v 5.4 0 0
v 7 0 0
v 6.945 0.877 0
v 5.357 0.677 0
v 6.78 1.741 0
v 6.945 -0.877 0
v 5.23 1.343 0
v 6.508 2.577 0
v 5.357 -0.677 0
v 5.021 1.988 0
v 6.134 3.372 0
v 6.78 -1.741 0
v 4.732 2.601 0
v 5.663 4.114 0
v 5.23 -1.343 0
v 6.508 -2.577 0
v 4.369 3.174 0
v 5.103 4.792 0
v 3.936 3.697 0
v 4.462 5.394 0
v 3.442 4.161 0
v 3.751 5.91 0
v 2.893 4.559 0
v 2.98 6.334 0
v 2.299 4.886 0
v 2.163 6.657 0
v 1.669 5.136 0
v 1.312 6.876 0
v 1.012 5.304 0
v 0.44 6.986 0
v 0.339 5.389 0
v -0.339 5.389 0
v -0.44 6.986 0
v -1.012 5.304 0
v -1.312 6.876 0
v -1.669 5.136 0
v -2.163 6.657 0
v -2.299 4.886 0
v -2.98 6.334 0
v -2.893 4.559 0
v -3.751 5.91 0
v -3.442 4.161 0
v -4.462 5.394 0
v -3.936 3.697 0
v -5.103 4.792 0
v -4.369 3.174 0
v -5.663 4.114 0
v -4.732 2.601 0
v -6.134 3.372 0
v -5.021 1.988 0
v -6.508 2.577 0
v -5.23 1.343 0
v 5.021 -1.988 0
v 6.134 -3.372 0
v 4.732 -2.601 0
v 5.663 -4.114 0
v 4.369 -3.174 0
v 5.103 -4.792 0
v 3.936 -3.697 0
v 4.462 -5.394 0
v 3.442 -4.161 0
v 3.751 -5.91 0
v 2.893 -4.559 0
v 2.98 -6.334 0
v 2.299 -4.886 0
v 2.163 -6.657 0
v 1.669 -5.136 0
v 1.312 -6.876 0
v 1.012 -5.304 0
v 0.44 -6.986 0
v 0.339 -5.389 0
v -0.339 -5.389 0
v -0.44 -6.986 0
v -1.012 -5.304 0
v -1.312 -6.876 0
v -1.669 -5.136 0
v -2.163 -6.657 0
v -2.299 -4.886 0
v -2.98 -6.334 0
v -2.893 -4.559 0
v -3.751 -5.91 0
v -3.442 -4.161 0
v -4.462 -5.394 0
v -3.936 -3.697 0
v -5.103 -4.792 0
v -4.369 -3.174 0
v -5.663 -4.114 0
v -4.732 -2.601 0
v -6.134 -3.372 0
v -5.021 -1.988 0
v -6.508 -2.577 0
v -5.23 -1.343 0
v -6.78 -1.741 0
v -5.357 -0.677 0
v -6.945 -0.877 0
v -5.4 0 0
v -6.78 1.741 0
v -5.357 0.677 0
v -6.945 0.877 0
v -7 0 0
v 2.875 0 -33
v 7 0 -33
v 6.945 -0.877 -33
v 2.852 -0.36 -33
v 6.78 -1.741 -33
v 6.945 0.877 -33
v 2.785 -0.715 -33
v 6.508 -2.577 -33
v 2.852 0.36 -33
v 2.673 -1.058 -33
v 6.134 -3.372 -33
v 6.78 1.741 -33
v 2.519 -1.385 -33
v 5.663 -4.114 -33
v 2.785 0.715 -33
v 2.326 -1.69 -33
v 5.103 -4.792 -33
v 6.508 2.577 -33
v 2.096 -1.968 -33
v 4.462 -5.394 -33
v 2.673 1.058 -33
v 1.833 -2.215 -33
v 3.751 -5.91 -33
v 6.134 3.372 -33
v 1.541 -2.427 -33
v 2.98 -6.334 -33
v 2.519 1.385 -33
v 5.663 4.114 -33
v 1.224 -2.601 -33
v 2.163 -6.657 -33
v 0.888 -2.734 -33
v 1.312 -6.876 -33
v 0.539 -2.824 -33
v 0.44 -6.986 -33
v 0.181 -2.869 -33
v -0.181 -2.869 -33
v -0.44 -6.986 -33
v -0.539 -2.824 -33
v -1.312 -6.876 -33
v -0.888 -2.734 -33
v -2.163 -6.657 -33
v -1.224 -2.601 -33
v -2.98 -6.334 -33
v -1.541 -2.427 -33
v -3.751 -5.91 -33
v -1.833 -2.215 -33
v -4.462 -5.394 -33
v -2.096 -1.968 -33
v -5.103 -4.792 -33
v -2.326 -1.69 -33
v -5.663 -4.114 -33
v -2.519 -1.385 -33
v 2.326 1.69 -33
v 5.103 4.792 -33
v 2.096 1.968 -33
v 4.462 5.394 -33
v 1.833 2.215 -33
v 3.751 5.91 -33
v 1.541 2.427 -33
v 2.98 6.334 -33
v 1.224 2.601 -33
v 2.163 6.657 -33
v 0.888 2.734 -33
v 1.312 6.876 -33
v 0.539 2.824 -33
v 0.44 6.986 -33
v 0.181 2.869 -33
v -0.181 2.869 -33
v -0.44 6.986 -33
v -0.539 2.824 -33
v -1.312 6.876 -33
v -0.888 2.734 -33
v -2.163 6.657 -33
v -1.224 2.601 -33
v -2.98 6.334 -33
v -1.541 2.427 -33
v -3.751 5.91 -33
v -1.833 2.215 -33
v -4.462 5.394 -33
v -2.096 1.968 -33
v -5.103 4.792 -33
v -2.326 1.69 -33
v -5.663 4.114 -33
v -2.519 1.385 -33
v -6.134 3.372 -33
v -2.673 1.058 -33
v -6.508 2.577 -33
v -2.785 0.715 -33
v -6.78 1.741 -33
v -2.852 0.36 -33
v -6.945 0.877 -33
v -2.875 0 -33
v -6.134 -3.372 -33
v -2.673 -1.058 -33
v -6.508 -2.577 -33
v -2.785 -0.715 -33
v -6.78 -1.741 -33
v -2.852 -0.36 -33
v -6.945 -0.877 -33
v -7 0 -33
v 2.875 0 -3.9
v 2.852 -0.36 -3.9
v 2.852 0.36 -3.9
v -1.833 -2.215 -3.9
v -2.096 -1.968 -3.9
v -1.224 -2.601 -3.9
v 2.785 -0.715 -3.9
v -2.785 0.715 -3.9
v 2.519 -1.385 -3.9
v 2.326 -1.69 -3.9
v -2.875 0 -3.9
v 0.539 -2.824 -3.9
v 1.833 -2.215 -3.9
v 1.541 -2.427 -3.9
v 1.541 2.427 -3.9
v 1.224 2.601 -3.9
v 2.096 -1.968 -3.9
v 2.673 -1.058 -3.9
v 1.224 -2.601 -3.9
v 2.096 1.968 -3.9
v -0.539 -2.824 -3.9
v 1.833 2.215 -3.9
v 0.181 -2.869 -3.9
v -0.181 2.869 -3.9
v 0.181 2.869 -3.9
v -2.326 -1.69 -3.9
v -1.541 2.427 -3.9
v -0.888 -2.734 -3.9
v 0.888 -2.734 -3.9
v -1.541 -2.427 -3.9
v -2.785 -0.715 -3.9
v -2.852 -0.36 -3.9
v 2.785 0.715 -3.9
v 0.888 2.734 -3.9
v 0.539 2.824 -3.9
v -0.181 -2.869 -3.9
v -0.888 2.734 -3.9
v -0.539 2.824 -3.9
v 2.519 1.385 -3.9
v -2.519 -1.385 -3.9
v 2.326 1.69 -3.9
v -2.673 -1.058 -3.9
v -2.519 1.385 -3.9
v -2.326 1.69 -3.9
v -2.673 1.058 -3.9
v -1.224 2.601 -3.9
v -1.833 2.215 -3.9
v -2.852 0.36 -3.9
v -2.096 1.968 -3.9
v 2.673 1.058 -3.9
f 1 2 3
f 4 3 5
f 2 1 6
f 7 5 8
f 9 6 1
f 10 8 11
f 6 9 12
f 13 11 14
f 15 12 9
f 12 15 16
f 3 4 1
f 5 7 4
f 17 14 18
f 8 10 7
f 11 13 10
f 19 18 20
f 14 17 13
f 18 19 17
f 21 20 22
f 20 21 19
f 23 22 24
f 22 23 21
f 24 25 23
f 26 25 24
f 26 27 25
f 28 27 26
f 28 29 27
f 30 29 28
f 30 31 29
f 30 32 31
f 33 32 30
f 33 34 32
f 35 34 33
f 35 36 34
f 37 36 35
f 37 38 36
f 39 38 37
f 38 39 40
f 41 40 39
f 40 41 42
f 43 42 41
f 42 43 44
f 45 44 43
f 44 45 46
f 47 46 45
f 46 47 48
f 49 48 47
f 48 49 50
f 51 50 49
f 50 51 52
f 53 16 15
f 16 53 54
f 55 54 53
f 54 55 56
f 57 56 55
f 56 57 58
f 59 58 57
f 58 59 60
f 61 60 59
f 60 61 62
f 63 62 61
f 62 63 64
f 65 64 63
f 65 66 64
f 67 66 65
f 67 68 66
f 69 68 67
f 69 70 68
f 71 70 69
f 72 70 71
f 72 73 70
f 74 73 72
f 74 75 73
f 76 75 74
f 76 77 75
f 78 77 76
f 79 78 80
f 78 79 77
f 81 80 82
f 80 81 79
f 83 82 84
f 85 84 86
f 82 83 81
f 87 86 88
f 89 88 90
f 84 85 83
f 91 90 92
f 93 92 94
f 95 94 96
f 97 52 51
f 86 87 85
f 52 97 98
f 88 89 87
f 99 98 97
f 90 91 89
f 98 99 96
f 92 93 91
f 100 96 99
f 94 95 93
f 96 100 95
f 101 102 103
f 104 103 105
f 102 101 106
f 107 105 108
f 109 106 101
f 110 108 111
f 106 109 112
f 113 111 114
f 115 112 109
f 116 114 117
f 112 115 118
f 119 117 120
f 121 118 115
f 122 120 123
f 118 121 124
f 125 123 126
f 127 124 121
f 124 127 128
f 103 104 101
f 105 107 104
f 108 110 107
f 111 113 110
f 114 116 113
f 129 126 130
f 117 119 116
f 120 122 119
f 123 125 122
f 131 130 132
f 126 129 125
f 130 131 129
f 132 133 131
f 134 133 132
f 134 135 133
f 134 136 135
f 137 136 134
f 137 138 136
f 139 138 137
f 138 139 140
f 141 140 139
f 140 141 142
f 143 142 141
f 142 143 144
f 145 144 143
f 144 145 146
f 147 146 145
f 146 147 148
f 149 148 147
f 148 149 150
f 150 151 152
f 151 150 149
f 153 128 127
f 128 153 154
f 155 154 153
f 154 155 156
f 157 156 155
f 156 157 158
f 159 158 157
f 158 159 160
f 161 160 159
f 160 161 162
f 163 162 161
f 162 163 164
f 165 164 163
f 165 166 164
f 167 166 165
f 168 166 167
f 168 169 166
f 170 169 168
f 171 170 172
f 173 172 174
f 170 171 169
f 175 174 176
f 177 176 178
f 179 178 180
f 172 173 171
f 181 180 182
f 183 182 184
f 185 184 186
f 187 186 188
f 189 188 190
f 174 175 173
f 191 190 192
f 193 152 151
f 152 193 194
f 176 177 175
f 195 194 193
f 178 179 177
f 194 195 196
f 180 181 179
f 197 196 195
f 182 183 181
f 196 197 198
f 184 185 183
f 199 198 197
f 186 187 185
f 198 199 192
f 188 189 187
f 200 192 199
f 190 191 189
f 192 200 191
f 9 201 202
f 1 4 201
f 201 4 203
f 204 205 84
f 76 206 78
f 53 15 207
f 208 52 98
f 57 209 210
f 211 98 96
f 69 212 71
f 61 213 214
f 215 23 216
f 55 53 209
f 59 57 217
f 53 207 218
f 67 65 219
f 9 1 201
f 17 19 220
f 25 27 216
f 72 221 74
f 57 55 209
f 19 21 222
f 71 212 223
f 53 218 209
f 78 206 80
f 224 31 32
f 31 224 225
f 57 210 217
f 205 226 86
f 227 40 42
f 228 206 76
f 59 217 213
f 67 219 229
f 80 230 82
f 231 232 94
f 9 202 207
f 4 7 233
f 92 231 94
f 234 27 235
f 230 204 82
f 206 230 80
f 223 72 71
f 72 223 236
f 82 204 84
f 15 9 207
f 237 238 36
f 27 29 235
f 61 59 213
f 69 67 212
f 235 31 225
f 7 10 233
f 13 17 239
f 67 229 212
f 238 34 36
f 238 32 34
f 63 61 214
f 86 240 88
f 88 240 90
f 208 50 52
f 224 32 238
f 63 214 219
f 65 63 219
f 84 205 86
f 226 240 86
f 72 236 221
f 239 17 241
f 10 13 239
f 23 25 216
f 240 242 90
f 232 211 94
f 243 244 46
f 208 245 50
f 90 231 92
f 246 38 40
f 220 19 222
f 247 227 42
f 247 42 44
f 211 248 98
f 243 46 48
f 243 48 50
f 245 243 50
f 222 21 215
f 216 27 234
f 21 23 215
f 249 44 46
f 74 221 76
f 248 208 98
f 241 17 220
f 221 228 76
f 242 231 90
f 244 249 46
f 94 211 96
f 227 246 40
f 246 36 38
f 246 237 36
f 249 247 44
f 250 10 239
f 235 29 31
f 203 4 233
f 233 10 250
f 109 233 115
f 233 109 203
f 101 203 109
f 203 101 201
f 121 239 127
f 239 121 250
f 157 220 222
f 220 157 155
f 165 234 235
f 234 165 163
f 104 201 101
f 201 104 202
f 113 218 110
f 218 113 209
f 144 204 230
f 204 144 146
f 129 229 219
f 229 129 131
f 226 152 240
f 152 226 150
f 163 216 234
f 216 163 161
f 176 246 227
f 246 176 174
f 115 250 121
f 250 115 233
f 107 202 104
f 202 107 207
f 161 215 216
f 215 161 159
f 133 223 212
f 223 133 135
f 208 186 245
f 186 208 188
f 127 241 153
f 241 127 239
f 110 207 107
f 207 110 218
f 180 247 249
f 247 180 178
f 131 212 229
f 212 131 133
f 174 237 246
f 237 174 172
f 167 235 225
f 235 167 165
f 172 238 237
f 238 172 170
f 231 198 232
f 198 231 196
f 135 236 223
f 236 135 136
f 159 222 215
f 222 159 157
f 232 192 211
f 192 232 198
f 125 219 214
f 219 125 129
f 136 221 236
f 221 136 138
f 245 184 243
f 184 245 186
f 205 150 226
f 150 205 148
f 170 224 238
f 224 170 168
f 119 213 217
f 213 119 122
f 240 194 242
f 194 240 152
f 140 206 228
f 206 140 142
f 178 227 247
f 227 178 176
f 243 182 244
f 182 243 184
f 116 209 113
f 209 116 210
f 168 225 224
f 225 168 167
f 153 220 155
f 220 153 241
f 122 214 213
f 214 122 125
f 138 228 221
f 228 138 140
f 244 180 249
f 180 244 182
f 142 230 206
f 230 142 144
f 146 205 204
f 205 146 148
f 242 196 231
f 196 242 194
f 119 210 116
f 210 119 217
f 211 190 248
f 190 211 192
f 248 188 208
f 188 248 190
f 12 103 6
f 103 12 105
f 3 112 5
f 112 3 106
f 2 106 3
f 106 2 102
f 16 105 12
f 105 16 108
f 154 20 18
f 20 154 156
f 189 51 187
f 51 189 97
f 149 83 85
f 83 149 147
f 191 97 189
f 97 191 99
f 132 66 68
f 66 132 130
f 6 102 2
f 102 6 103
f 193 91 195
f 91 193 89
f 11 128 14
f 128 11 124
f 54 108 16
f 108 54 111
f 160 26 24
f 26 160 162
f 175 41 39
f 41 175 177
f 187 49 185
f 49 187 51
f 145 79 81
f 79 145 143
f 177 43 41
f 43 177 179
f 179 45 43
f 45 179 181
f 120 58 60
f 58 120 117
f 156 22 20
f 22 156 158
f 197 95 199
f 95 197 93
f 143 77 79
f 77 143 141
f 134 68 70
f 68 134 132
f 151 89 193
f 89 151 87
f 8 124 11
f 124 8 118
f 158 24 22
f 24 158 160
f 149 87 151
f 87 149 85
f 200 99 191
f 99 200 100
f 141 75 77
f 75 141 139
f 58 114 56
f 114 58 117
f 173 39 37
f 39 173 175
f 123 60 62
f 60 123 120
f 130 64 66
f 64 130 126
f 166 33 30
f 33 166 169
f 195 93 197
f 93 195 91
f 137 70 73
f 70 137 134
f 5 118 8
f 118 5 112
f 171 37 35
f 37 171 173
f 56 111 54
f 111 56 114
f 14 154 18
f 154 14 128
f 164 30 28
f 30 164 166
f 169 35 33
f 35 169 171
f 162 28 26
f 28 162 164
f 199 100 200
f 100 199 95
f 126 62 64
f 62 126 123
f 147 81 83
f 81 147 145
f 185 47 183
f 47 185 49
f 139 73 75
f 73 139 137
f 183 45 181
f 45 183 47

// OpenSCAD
$fn = 50;


difference() {
	union() {
		translate(v = [0, 0, -33.0000000000]) {
			cylinder(h = 33, r = 7.0000000000);
		}
		cylinder(h = 0, r = 13.0000000000);
	}
	union() {
		translate(v = [0, 0, 0]) {
			rotate(a = [0, 0, 0]) {
				difference() {
					union() {
						#translate(v = [0, 0, -33.0000000000]) {
							cylinder(h = 33, r = 2.6000000000);
						}
						#translate(v = [0, 0, -3.9000000000]) {
							cylinder(h = 3.9000000000, r = 7.0000000000, r1 = 2.8750000000, r2 = 5.4000000000);
						}
						#translate(v = [0, 0, -33.0000000000]) {
							cylinder(h = 33, r = 2.8750000000);
						}
						#translate(v = [0, 0, -33.0000000000]) {
							cylinder(h = 33, r = 2.6000000000);
						}
					}
					union();
				}
			}
		}
	}
}
